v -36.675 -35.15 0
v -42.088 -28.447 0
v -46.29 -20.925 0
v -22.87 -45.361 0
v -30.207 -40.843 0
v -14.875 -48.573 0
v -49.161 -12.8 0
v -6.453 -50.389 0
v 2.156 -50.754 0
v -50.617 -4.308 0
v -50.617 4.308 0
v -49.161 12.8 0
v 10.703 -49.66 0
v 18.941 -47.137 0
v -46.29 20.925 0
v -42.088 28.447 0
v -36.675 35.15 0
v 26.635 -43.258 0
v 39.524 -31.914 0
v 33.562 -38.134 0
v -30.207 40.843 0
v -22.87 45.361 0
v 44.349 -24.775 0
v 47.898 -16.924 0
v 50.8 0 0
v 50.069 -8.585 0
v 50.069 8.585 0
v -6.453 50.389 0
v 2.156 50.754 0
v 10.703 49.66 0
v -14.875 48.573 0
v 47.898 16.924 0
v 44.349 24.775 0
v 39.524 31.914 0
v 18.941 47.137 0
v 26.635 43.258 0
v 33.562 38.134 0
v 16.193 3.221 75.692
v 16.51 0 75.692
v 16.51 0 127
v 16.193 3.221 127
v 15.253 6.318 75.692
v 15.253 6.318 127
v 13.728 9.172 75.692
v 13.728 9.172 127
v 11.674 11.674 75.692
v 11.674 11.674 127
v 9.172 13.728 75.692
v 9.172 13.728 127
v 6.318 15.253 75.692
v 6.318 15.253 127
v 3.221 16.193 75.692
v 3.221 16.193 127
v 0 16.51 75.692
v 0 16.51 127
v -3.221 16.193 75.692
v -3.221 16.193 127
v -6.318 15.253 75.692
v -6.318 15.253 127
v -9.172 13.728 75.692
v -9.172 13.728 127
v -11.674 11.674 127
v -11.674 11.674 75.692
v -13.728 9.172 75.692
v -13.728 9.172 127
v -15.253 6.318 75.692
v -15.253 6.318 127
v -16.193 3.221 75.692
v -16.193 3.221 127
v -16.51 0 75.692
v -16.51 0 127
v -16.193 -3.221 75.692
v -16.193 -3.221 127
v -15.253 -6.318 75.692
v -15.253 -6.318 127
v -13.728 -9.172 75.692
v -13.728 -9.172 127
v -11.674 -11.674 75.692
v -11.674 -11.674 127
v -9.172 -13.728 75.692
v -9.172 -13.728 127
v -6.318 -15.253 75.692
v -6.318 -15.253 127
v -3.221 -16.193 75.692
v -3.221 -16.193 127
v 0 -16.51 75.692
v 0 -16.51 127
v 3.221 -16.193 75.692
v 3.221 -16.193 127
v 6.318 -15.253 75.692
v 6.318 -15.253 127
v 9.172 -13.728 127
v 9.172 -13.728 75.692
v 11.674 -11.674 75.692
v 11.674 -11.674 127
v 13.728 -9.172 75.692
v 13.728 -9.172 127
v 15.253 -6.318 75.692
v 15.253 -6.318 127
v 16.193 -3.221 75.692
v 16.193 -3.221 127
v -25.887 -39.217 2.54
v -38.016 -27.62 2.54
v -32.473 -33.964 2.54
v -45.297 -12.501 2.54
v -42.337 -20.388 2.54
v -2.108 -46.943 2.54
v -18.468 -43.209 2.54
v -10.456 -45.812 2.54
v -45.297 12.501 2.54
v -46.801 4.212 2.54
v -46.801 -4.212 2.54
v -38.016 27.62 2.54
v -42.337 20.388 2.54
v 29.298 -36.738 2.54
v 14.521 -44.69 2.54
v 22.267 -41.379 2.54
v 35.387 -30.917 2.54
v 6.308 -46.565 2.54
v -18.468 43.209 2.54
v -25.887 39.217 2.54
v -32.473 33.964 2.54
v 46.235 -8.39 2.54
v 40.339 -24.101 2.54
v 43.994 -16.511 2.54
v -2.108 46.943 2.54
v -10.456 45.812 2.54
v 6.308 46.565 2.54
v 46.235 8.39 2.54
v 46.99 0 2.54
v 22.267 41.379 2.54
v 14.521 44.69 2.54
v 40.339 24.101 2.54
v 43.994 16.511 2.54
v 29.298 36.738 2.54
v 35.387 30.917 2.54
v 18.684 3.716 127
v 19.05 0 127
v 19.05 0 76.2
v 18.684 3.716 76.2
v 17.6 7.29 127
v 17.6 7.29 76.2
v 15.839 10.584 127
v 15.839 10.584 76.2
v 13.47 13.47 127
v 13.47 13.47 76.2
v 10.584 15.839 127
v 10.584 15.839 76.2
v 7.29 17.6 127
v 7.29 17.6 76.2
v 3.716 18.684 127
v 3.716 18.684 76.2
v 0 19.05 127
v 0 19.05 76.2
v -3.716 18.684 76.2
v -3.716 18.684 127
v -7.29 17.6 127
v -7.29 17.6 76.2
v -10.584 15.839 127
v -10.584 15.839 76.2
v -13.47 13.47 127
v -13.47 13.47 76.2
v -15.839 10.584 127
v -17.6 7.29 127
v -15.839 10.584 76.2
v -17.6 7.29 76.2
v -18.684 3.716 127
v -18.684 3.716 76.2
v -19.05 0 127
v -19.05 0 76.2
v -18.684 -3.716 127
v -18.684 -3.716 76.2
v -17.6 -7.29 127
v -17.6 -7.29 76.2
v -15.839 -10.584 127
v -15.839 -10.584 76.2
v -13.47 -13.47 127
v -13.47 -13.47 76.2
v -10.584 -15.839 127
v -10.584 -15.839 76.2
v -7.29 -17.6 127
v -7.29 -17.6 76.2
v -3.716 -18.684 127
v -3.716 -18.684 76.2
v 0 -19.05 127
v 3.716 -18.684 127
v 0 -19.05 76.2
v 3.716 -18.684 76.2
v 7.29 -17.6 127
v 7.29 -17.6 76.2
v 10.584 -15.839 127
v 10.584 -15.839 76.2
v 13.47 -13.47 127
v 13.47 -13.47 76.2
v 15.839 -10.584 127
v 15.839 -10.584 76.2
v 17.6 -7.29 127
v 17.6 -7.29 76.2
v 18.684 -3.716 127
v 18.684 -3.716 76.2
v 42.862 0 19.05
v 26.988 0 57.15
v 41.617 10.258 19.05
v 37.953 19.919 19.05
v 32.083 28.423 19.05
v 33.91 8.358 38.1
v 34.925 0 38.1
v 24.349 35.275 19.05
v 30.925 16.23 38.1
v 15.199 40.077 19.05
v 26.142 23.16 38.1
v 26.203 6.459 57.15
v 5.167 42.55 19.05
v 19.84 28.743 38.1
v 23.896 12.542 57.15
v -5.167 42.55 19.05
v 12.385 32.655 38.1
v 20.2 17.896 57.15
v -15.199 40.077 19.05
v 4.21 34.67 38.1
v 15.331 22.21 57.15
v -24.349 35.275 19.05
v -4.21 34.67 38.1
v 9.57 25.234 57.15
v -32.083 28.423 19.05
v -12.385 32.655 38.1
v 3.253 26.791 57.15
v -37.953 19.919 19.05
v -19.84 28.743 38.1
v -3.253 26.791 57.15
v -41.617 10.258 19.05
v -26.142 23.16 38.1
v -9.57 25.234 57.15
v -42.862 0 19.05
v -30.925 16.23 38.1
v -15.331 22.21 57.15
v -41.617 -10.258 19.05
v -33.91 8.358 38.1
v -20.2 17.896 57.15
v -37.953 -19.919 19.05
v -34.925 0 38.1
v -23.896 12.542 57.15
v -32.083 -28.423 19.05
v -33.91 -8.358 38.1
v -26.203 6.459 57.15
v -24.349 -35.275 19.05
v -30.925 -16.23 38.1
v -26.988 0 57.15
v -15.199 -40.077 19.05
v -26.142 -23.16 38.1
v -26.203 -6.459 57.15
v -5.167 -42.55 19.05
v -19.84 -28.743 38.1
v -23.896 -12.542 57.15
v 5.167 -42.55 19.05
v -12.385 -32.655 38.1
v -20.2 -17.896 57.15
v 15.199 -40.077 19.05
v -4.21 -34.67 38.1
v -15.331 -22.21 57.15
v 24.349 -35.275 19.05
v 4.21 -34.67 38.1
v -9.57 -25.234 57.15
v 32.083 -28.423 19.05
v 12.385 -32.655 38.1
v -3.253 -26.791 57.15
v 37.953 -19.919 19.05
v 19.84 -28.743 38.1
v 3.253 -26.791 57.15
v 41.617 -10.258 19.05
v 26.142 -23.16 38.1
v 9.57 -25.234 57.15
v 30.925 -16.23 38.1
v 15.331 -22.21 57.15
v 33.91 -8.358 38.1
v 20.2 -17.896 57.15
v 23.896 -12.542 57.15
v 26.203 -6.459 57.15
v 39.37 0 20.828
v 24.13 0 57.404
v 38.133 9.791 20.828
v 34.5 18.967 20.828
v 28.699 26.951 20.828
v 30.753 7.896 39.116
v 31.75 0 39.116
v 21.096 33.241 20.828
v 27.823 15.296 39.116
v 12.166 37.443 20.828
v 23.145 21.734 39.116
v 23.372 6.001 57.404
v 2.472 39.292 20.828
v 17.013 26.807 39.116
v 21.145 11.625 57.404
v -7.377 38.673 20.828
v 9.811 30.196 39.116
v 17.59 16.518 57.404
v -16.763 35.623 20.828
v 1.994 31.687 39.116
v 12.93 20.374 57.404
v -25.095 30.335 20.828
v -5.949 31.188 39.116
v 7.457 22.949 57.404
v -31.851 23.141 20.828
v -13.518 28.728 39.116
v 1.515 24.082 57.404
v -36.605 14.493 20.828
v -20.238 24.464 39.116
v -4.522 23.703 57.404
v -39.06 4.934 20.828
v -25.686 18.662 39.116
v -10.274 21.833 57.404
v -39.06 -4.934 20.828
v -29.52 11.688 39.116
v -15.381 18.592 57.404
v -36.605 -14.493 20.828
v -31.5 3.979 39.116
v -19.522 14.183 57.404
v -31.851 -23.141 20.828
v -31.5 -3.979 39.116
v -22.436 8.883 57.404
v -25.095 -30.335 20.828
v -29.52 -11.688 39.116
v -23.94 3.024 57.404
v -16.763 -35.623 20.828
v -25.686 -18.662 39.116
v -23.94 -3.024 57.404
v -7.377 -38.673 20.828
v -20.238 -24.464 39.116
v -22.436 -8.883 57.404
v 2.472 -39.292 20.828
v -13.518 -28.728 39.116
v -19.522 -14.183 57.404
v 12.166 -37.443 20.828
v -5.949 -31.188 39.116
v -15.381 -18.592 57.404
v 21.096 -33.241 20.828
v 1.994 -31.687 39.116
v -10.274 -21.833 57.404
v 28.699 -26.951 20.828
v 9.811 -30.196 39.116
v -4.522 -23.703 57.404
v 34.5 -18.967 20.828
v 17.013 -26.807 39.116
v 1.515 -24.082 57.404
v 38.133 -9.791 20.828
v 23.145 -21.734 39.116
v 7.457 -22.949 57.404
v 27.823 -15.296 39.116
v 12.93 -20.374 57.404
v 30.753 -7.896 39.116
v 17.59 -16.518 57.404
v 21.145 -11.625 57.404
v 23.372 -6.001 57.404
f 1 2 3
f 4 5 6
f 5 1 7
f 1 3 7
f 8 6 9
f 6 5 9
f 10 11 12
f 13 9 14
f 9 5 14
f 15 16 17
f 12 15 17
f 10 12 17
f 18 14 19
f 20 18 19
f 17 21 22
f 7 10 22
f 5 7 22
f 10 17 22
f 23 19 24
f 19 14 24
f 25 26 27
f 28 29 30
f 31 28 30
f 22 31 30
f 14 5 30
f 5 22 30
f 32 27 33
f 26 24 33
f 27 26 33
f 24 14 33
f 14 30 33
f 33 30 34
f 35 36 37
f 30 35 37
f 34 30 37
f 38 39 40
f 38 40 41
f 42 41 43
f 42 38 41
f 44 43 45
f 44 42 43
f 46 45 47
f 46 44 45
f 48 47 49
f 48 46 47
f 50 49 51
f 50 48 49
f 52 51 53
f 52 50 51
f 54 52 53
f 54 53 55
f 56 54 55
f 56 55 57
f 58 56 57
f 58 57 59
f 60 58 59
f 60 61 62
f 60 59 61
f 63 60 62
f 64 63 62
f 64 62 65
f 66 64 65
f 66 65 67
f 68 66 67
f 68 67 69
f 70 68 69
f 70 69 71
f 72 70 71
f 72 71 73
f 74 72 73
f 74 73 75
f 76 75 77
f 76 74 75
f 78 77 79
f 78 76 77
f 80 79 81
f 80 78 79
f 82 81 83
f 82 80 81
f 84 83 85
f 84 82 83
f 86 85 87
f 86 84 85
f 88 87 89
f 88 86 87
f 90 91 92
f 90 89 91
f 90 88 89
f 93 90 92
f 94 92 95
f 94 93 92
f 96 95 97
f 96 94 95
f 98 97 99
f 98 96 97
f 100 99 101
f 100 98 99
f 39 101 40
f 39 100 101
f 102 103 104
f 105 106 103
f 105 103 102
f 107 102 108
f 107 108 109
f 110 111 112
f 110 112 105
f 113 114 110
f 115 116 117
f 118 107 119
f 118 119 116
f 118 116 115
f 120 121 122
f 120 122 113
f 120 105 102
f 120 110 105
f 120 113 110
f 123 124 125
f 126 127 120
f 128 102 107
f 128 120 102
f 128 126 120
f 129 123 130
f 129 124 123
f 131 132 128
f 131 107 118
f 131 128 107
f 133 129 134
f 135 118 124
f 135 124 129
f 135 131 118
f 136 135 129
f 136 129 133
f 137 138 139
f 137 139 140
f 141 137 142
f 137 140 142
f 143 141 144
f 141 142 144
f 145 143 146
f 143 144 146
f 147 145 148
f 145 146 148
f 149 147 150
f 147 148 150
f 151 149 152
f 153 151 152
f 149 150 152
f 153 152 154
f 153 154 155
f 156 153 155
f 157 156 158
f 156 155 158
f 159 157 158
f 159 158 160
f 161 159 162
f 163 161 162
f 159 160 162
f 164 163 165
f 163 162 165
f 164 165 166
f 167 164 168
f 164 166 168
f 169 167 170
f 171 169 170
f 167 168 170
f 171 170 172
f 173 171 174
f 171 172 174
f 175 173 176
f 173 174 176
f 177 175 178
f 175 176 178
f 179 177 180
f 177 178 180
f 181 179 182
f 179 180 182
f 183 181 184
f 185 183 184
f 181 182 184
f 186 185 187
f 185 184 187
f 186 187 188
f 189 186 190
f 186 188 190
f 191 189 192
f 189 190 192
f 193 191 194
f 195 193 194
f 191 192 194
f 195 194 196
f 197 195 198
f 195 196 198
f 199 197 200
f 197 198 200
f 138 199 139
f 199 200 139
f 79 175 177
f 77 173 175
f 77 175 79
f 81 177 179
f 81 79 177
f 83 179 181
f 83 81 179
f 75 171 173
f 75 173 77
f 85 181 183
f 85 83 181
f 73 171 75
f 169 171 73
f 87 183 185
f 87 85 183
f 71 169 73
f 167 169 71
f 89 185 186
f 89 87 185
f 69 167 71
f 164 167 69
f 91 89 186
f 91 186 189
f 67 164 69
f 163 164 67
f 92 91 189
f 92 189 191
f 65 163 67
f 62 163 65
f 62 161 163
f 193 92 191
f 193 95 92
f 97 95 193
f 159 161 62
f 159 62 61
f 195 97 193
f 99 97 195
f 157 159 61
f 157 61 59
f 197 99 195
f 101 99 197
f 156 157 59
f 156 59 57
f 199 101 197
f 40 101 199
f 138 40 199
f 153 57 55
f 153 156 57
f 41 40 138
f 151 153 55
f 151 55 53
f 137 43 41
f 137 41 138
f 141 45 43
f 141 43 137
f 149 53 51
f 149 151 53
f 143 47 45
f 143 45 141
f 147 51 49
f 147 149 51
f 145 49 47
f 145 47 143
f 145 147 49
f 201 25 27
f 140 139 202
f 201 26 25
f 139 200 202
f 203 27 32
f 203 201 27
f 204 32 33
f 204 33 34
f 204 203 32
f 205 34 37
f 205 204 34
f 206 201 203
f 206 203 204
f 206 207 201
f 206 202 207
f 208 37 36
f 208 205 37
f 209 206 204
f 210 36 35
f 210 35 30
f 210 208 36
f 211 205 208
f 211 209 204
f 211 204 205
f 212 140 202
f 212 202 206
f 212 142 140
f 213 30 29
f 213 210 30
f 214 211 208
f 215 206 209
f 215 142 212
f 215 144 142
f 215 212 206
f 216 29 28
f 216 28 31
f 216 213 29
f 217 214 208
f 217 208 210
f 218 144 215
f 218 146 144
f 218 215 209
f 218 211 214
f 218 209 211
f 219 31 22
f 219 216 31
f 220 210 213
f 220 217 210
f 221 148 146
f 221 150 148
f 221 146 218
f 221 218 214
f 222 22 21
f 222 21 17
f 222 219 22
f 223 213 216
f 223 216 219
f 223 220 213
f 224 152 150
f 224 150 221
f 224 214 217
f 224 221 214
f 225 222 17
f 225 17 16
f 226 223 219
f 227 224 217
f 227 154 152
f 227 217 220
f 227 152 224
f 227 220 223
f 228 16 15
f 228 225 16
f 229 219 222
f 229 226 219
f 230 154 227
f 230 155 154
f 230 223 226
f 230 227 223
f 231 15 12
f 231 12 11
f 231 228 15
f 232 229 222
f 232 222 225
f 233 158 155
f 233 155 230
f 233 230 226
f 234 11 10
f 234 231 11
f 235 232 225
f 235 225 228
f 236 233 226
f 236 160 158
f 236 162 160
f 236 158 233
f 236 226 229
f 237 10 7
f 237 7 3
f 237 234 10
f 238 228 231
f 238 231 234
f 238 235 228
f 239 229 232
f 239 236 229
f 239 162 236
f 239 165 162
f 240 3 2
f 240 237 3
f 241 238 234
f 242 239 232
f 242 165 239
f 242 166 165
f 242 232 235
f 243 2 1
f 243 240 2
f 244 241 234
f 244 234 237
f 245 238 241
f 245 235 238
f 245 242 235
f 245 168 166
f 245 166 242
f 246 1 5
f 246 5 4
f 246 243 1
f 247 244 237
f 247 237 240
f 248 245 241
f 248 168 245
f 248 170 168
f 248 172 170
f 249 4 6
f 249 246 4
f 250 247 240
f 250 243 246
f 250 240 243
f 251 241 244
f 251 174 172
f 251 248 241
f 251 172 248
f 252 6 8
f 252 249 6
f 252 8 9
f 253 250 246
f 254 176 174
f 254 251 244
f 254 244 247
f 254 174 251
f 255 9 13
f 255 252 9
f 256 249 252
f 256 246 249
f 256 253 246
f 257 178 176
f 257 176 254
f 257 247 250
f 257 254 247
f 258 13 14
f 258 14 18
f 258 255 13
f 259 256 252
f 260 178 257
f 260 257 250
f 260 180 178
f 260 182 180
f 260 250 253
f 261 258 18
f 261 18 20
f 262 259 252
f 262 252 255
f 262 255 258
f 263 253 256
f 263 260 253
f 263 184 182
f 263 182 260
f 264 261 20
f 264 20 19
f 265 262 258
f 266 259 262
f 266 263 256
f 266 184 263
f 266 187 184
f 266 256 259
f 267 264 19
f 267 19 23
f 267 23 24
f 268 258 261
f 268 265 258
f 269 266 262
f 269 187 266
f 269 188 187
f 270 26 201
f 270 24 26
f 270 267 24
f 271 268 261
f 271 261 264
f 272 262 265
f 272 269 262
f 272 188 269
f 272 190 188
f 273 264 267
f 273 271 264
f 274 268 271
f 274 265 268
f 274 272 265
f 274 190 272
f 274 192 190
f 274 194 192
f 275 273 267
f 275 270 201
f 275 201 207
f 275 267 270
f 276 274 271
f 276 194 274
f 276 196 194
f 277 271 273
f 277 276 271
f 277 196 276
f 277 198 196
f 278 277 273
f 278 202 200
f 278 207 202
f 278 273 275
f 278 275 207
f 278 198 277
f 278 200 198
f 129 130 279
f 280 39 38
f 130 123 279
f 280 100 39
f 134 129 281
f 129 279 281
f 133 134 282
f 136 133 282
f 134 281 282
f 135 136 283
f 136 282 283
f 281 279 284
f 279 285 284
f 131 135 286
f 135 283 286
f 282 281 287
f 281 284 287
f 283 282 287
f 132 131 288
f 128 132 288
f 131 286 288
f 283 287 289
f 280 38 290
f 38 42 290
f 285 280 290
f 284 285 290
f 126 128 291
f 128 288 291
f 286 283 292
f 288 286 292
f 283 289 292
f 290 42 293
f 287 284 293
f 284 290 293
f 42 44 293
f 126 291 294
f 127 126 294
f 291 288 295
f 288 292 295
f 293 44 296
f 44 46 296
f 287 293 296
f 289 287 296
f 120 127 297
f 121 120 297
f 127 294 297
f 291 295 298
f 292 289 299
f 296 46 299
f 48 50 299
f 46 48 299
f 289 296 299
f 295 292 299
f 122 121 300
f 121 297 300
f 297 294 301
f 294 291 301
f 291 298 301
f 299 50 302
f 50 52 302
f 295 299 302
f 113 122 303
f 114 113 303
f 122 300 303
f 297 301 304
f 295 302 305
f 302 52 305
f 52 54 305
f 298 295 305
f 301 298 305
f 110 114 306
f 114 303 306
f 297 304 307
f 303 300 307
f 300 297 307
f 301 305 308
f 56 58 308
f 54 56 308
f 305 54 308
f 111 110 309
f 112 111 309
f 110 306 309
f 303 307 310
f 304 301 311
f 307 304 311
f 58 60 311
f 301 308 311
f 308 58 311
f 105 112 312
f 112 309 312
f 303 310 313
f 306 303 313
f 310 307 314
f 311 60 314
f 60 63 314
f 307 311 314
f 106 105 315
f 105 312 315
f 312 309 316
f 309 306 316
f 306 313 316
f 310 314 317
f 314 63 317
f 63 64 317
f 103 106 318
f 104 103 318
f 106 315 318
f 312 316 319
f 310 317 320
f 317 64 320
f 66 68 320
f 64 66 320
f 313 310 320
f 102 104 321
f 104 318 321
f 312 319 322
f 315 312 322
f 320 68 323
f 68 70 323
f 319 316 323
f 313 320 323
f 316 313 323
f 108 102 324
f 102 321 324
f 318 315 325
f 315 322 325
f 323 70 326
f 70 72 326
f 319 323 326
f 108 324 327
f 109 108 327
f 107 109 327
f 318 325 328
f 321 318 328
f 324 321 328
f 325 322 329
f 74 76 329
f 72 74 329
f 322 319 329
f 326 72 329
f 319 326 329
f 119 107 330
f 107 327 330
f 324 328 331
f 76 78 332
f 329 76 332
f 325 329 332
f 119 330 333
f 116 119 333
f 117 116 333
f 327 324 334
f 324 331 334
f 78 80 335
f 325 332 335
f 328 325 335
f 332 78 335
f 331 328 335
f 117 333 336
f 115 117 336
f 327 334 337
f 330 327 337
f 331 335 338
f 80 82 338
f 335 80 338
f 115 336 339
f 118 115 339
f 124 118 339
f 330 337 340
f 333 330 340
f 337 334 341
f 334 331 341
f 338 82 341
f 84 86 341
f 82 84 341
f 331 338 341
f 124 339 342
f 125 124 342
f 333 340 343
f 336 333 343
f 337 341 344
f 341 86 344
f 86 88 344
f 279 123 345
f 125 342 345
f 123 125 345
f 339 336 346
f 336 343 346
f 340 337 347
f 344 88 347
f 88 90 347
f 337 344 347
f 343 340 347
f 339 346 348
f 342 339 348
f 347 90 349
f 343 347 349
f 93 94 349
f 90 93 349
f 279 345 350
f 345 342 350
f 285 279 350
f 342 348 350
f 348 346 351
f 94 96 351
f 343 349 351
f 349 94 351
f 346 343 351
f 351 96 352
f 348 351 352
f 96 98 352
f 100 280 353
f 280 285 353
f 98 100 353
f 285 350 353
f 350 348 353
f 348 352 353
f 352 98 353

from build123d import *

# Parameters (mm, degrees)
F0_R     = 50.8
F2_R     = 19.05
F4_R     = 19.05
F5_DEPTH = 50.8
F6_T     = -2.54


with BuildPart() as f3:
    # F0 (on Top) → F3 section 0
    with BuildSketch(Plane.XY):
        Circle(F0_R)
    # F2 (on offset) → F3 section 1
    with BuildSketch(Plane.XY.offset(76.2)):
        Circle(F2_R)
    loft()

    # F4 (on face) → F5 (join)
    with BuildSketch(Plane.XY.offset(76.2)):
        Circle(F4_R)
    extrude(amount=F5_DEPTH)

    # F6
    f6_openings = [f3.faces().sort_by_distance(p)[0] for p in [
        (0, 0, 127),
    ]]
    offset(amount=F6_T, openings=f6_openings, kind=Kind.INTERSECTION)


solid = f3.part
